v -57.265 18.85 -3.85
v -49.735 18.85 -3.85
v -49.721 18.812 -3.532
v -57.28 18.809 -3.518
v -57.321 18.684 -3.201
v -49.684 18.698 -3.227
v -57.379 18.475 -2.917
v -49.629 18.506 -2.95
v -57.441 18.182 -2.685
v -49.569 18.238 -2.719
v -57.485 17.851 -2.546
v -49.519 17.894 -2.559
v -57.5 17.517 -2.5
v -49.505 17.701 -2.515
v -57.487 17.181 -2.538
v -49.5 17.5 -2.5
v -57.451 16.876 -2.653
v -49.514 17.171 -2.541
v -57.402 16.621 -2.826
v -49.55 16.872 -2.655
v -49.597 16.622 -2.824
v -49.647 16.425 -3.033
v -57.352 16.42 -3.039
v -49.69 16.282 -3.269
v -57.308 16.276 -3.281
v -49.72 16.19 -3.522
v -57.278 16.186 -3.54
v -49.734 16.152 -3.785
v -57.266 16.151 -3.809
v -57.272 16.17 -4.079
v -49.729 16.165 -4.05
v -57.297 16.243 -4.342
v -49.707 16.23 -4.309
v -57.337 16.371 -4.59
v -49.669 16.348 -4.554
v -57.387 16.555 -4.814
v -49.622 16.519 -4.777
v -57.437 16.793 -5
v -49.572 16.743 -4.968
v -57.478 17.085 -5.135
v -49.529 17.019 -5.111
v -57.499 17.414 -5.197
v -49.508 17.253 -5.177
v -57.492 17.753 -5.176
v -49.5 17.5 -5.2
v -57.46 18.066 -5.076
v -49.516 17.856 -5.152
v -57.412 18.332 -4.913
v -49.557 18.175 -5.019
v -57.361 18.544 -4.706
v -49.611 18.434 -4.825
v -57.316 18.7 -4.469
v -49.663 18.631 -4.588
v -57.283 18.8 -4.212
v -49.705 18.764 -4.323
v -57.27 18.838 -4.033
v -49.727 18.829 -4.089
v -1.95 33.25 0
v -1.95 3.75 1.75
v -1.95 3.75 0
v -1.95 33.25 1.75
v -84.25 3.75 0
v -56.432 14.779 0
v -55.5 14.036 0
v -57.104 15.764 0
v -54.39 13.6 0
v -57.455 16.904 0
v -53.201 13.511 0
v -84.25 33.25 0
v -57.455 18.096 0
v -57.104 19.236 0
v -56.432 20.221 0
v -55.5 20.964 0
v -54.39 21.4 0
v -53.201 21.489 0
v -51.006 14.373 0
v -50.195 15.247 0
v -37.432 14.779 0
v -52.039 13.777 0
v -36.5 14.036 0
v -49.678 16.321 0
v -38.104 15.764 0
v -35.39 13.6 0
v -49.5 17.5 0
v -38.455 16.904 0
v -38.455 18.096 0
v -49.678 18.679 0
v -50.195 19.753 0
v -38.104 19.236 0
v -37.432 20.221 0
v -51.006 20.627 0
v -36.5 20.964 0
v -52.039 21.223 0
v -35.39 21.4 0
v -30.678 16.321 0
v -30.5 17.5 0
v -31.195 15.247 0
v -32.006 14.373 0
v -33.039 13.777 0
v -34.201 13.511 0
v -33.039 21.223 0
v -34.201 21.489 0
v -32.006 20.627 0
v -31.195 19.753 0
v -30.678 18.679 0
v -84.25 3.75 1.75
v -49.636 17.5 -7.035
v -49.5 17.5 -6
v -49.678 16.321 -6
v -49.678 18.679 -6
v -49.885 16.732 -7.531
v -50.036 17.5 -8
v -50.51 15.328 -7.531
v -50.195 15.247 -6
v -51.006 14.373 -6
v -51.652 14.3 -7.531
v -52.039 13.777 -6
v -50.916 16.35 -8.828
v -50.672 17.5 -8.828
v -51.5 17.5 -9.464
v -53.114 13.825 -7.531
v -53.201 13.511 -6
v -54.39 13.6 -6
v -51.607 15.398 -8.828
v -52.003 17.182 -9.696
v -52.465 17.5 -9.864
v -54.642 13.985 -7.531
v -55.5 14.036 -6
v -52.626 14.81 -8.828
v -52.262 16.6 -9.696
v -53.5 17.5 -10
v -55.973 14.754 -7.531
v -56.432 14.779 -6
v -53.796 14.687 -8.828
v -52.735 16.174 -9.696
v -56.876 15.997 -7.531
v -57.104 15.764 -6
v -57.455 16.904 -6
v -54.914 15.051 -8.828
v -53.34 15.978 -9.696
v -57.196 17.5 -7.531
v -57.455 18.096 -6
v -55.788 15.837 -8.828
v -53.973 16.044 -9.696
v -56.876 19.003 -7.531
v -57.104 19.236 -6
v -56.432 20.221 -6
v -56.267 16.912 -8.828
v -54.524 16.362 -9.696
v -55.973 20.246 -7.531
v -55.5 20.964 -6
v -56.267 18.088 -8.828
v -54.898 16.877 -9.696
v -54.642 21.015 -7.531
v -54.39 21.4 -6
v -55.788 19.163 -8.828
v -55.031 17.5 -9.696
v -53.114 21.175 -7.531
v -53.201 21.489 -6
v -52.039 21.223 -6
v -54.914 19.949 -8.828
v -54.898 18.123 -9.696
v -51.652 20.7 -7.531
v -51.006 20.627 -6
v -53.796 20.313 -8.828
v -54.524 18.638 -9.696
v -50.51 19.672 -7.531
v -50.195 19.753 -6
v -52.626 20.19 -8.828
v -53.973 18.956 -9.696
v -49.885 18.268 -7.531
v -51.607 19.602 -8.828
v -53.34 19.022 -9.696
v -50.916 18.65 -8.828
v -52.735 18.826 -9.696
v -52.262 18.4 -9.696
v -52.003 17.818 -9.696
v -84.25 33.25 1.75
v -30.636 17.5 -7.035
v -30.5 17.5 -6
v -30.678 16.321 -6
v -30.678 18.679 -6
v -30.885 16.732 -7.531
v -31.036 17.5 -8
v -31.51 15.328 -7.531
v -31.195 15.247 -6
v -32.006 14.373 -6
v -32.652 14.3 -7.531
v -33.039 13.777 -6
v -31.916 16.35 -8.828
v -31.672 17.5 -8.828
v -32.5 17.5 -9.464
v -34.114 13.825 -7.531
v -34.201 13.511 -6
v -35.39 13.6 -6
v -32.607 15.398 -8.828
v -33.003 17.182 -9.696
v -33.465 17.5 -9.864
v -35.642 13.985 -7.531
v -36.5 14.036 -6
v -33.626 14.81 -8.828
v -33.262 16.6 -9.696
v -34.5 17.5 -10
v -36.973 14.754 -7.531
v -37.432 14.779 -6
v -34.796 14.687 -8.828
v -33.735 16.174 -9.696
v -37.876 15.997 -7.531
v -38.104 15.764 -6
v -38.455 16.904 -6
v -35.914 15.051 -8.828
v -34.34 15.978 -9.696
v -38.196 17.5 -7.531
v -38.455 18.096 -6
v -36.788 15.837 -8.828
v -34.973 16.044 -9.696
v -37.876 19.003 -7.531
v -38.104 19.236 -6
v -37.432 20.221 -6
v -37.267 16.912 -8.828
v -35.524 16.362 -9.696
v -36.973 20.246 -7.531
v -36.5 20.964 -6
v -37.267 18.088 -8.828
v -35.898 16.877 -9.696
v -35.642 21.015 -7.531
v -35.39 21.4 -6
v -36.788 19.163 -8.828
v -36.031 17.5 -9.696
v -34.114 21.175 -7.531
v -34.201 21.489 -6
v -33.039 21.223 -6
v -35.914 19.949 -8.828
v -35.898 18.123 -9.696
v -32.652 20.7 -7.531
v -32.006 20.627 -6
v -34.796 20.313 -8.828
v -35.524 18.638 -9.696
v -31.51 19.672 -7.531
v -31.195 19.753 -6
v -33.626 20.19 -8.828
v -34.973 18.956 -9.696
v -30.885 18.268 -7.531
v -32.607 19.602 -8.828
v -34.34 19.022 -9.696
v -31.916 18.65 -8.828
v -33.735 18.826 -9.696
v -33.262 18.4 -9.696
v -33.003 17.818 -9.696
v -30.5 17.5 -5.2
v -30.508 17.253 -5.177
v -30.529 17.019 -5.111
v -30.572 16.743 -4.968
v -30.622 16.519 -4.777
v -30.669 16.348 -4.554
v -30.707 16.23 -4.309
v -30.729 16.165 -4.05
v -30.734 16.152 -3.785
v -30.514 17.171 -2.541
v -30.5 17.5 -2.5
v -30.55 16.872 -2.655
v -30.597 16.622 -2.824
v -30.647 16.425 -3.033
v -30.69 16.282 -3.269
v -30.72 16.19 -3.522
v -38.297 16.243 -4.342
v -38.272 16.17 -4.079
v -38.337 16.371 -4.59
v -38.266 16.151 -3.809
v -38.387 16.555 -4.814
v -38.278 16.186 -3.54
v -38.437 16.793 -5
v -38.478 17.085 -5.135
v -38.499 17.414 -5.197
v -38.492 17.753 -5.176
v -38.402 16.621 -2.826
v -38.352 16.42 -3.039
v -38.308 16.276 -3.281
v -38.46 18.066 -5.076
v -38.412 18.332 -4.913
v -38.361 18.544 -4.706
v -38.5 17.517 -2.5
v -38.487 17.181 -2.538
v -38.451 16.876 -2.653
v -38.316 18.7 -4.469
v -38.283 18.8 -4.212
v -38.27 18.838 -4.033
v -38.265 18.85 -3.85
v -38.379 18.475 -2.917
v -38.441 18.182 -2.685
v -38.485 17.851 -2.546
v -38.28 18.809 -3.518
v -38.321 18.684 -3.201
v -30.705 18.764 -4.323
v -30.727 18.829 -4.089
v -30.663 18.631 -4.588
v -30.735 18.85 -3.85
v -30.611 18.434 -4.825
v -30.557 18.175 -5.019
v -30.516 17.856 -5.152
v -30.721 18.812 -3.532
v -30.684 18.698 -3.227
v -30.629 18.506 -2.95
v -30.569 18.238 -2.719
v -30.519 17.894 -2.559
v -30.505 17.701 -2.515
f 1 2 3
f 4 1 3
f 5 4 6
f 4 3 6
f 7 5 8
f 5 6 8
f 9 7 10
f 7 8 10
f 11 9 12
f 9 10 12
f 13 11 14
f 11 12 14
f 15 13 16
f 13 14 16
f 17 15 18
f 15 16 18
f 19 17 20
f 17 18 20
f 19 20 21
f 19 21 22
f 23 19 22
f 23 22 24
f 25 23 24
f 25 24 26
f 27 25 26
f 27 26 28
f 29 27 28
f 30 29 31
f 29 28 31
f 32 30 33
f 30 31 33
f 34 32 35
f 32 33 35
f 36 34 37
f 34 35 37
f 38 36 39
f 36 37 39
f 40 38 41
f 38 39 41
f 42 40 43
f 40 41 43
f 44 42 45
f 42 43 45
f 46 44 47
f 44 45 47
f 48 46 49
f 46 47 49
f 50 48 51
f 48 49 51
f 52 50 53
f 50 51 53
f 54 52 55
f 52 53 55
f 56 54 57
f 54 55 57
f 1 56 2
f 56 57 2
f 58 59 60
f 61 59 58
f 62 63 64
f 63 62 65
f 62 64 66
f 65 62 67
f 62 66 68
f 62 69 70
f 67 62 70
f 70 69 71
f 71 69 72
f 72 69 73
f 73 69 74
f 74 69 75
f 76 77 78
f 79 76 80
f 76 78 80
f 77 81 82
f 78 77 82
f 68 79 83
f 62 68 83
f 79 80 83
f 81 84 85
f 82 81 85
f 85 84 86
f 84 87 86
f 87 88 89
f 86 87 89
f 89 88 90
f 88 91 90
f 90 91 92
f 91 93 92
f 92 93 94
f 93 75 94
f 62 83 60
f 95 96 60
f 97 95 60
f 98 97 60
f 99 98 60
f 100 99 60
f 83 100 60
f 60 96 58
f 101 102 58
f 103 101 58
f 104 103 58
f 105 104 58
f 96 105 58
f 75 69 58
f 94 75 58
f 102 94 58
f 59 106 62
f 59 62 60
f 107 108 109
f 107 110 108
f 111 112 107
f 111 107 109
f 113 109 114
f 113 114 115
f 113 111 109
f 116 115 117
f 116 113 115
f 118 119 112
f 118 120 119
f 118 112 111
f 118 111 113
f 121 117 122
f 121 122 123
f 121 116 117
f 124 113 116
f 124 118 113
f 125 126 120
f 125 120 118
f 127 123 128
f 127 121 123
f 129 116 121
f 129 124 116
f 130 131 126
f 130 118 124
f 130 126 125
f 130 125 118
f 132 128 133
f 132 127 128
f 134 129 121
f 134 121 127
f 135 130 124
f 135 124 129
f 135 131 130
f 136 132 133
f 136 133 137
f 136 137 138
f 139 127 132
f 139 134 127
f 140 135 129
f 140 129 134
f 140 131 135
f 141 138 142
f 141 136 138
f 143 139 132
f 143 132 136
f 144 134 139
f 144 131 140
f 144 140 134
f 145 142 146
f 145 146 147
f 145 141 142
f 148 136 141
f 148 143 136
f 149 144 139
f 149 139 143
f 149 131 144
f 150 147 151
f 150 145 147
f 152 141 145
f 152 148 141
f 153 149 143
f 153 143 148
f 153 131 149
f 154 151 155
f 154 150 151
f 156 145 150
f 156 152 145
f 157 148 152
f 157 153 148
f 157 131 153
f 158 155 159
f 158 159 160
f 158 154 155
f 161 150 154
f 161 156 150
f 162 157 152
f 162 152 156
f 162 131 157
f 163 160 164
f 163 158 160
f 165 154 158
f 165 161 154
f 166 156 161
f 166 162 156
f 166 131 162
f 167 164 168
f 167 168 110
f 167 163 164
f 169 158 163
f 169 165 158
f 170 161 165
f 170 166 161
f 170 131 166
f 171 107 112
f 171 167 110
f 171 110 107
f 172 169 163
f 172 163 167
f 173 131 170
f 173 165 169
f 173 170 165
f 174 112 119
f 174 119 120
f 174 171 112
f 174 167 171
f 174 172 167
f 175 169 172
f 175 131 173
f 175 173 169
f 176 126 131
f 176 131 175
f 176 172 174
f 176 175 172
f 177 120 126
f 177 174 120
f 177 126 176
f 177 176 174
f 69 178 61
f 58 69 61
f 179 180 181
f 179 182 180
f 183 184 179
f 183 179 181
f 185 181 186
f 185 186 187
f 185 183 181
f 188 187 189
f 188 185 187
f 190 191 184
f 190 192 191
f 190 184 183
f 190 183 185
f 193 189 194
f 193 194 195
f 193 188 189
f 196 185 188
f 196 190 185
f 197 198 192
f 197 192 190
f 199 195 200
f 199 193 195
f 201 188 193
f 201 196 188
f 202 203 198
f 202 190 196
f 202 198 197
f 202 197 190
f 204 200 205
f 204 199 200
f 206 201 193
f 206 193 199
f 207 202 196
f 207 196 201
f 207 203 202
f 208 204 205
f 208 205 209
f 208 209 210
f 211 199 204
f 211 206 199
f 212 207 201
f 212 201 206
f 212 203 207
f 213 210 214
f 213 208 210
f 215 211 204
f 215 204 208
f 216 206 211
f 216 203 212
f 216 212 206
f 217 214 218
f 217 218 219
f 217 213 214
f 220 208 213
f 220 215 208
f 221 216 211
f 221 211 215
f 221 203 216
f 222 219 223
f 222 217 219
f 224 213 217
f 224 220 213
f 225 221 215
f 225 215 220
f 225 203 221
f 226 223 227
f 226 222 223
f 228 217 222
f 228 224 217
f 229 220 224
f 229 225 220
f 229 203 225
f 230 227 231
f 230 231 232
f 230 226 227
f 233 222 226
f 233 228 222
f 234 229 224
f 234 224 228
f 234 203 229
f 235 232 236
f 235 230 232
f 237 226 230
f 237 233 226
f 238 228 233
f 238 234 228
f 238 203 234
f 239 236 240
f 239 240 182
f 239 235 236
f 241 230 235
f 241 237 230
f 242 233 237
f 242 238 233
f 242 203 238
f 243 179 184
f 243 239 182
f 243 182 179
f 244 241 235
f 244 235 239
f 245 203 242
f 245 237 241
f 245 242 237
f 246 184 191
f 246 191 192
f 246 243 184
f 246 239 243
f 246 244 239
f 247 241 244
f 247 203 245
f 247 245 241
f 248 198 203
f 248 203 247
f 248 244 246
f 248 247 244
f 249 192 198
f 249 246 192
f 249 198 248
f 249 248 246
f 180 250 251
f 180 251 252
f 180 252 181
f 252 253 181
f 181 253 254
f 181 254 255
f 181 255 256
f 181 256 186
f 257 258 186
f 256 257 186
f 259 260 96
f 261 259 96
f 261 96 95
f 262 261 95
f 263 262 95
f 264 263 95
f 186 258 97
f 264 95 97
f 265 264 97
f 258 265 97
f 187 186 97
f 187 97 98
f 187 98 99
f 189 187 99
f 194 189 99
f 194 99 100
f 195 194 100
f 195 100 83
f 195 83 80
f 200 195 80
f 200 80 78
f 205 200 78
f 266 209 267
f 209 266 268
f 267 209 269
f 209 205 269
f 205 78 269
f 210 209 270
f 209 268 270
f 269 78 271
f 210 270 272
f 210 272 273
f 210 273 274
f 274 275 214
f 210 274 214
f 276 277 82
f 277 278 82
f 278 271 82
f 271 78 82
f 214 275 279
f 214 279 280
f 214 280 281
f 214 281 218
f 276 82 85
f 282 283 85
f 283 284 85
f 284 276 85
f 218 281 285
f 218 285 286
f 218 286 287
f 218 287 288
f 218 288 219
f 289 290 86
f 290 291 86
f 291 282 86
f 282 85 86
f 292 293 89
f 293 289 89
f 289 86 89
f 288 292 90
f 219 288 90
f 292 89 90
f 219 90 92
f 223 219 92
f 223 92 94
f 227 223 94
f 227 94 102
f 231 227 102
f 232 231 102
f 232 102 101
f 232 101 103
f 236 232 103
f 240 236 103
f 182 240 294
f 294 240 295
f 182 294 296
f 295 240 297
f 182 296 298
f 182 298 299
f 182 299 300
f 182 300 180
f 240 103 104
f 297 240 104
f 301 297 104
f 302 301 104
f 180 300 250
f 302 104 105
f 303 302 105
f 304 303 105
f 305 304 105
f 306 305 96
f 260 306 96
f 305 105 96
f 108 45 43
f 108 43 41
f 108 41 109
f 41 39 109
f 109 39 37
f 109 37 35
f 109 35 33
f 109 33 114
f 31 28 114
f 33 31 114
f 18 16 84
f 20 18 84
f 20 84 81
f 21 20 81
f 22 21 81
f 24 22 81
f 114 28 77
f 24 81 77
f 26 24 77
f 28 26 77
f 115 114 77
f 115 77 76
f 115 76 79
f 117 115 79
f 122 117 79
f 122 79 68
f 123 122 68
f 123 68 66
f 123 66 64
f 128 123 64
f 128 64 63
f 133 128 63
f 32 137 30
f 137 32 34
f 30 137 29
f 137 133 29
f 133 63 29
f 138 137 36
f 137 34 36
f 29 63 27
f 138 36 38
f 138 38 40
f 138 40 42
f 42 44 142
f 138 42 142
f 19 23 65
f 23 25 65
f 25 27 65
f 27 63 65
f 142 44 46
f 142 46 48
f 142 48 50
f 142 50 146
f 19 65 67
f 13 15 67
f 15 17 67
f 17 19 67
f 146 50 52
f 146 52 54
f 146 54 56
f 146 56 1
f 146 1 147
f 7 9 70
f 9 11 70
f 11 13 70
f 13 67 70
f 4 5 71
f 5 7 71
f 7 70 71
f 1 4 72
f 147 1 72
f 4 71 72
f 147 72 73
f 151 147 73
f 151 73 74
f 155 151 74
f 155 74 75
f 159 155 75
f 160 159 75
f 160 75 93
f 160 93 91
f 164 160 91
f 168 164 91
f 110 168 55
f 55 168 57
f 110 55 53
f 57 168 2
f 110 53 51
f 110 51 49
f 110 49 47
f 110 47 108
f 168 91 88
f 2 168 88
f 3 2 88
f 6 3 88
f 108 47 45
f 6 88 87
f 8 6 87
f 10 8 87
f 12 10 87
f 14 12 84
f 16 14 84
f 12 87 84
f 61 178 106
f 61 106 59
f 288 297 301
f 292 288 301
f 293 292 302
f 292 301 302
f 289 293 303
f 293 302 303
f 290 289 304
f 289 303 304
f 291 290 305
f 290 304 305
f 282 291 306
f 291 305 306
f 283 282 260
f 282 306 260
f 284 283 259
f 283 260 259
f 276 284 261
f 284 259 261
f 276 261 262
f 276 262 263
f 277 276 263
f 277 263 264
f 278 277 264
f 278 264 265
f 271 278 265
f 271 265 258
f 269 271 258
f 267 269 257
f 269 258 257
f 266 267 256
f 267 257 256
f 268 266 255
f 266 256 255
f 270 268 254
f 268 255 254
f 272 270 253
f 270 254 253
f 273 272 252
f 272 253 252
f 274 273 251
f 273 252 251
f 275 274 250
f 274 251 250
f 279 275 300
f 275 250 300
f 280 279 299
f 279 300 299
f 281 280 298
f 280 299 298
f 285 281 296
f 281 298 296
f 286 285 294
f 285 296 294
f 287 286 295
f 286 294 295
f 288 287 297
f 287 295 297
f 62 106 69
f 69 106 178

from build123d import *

# Parameters (mm, degrees)
F0_W      = 88
F0_H      = 37
F1_DEPTH  = 1.75
F2_W      = 82.3
F2_H      = 29.5
F3_DEPTH  = 1.5
F4_R      = 4
F5_DEPTH  = 10
F6_R      = 4
F7_R      = 1.35
F8_DEPTH  = 88.001
F9_R      = 3
F10_DEPTH = 25


with BuildPart() as f1:
    # F0 (on Top) → F1 (new body)
    with BuildSketch(Plane.XY):
        with Locations((-44, 18.5)):
            Rectangle(F0_W, F0_H)
    extrude(amount=F1_DEPTH)

    # F2 (on face) → F3 (join)
    with BuildSketch(Plane.XY.offset(1.75)):
        with Locations((-43.1, 18.5)):
            Rectangle(F2_W, F2_H)
    extrude(amount=F3_DEPTH)

    # F4 (on face) → F5 (join)
    with BuildSketch(Plane(origin=(0, 0, 0), x_dir=(1, 0, 0), z_dir=(0, 0, -1))):
        with Locations((-53.5, -17.5)):
            Circle(F4_R)
        with Locations((-34.5, -17.5)):
            Circle(F4_R)
    extrude(amount=F5_DEPTH)

    # F6
    f6_edges = [f1.edges().sort_by_distance(p)[0] for p in [
        (-57.5, 17.5, -10),
        (-38.5, 17.5, -10),
    ]]
    fillet(f6_edges, radius=F6_R)

    # F7 (on face) → F8 (cut, through all)
    with BuildSketch(Plane.YZ):
        with Locations((17.5, -3.85)):
            Circle(F7_R)
    extrude(amount=-F8_DEPTH, mode=Mode.SUBTRACT)

    # F9
    f9_edges = [f1.edges().sort_by_distance(p)[0] for p in [
        (-88, 0, 0.875),
        (-88, 37, 0.875),
        (0, 37, 0.875),
        (0, 0, 0.875),
    ]]
    fillet(f9_edges, radius=F9_R)

    # F2 (on face) → F10 (intersect)
    with BuildSketch(Plane.XY.offset(1.75)):
        with Locations((-43.1, 18.5)):
            Rectangle(F2_W, F2_H)
    extrude(amount=-F10_DEPTH, mode=Mode.INTERSECT)


solid = f1.part
